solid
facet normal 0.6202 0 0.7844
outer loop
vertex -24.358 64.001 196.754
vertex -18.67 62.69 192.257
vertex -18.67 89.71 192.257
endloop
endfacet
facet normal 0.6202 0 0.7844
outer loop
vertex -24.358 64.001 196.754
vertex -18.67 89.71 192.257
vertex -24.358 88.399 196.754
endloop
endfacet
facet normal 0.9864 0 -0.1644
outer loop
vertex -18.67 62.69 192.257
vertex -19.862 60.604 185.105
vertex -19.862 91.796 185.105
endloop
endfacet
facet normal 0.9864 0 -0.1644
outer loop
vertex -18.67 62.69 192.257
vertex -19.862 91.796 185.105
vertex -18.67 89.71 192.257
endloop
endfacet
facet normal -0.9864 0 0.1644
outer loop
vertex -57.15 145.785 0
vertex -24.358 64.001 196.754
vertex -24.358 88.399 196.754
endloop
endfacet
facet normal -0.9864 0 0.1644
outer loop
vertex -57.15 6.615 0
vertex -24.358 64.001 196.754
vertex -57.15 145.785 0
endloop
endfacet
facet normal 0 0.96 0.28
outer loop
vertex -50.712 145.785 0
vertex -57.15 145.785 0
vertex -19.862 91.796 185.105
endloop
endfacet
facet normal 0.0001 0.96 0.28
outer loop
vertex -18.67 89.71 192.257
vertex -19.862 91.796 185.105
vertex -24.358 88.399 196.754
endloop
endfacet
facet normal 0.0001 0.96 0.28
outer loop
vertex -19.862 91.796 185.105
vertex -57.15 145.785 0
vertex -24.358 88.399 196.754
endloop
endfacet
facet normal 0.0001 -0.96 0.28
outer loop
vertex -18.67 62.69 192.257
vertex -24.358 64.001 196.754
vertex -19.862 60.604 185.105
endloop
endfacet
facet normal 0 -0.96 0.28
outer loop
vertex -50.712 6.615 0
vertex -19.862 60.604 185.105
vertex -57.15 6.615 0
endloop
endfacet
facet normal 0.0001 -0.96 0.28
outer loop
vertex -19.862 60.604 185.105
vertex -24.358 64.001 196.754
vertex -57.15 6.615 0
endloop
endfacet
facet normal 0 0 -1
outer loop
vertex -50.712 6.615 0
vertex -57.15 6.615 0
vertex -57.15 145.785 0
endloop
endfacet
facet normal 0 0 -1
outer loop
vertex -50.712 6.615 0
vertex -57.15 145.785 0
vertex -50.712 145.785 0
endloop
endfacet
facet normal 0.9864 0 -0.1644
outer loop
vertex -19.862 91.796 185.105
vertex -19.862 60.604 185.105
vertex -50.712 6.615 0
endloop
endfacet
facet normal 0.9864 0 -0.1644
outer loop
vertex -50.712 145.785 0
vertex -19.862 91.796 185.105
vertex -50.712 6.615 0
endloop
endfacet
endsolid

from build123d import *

# Parameters (mm, degrees)
BOSS_EXTRUDE1_DEPTH = 152.4
SKETCH3_OUTSIDE_W   = 273.93
SKETCH3_OUTSIDE_H   = 229.576
CUT_EXTRUDE2_DEPTH  = 381.660734008
SHELL1_T            = -6.35
CUT_EXTRUDE3_DEPTH  = 381.660734008
CUT_EXTRUDE4_DEPTH  = 332.131034202


with BuildPart() as part:
    # Sketch2 → Boss-Extrude1 (new body)
    with BuildSketch(Plane(origin=(0, 0, 0), x_dir=(1, 0, 0), z_dir=(0, 1, 0))):
        Polygon((-57.15, 0), (224.536, 0), (-24.357683353, -196.753899884), align=None)
    extrude(amount=BOSS_EXTRUDE1_DEPTH)

    # Sketch3 outside → Cut-Extrude2 (cut, through all)
    with BuildSketch(Plane(origin=(-63.5, 0, 0), x_dir=(0, 0, -1), z_dir=(1, 0, 0))):
        with Locations((-98.377, 76.2)):
            Rectangle(SKETCH3_OUTSIDE_W, SKETCH3_OUTSIDE_H)
        Polygon((0, 152.4), (-152.4, 107.95), (-261.257142857, 76.2), (-152.4, 44.45), (0, 0), align=None, mode=Mode.SUBTRACT)
    extrude(amount=CUT_EXTRUDE2_DEPTH, mode=Mode.SUBTRACT)

    # Shell1
    shell1_openings = [part.faces().sort_by_distance(p)[0] for p in [
        (83.693, 76.2, 0),
    ]]
    offset(amount=SHELL1_T, openings=shell1_openings, kind=Kind.INTERSECTION)

    # Sketch4 → Cut-Extrude3 (cut, through all)
    with BuildSketch(Plane(origin=(-63.5, 0, 0), x_dir=(0, 0, -1), z_dir=(1, 0, 0))):
        Polygon((0, 152.4), (0, 145.785416667), (-196.753899884, 88.398862534), (-196.753899884, 95.013445867), align=None)
        Polygon((-196.753899884, 64.001137466), (0, 6.614583333), (0, 0), (-196.753899884, 57.386554133), align=None)
    extrude(amount=CUT_EXTRUDE3_DEPTH, mode=Mode.SUBTRACT)

    # Sketch5 → Cut-Extrude4 (cut, through all)
    with BuildSketch(Plane(origin=(0, 149.86, 0), x_dir=(1, 0, 0), z_dir=(0, 1, 0))):
        Polygon((-19.861548271, -185.105168304), (-18.669521453, -192.257329212), (344.317071882, -192.257329212), (317.879717865, 72.864270331), (-35.136715197, 43.31663937), align=None)
    extrude(amount=-CUT_EXTRUDE4_DEPTH, mode=Mode.SUBTRACT)


solid = part.part
